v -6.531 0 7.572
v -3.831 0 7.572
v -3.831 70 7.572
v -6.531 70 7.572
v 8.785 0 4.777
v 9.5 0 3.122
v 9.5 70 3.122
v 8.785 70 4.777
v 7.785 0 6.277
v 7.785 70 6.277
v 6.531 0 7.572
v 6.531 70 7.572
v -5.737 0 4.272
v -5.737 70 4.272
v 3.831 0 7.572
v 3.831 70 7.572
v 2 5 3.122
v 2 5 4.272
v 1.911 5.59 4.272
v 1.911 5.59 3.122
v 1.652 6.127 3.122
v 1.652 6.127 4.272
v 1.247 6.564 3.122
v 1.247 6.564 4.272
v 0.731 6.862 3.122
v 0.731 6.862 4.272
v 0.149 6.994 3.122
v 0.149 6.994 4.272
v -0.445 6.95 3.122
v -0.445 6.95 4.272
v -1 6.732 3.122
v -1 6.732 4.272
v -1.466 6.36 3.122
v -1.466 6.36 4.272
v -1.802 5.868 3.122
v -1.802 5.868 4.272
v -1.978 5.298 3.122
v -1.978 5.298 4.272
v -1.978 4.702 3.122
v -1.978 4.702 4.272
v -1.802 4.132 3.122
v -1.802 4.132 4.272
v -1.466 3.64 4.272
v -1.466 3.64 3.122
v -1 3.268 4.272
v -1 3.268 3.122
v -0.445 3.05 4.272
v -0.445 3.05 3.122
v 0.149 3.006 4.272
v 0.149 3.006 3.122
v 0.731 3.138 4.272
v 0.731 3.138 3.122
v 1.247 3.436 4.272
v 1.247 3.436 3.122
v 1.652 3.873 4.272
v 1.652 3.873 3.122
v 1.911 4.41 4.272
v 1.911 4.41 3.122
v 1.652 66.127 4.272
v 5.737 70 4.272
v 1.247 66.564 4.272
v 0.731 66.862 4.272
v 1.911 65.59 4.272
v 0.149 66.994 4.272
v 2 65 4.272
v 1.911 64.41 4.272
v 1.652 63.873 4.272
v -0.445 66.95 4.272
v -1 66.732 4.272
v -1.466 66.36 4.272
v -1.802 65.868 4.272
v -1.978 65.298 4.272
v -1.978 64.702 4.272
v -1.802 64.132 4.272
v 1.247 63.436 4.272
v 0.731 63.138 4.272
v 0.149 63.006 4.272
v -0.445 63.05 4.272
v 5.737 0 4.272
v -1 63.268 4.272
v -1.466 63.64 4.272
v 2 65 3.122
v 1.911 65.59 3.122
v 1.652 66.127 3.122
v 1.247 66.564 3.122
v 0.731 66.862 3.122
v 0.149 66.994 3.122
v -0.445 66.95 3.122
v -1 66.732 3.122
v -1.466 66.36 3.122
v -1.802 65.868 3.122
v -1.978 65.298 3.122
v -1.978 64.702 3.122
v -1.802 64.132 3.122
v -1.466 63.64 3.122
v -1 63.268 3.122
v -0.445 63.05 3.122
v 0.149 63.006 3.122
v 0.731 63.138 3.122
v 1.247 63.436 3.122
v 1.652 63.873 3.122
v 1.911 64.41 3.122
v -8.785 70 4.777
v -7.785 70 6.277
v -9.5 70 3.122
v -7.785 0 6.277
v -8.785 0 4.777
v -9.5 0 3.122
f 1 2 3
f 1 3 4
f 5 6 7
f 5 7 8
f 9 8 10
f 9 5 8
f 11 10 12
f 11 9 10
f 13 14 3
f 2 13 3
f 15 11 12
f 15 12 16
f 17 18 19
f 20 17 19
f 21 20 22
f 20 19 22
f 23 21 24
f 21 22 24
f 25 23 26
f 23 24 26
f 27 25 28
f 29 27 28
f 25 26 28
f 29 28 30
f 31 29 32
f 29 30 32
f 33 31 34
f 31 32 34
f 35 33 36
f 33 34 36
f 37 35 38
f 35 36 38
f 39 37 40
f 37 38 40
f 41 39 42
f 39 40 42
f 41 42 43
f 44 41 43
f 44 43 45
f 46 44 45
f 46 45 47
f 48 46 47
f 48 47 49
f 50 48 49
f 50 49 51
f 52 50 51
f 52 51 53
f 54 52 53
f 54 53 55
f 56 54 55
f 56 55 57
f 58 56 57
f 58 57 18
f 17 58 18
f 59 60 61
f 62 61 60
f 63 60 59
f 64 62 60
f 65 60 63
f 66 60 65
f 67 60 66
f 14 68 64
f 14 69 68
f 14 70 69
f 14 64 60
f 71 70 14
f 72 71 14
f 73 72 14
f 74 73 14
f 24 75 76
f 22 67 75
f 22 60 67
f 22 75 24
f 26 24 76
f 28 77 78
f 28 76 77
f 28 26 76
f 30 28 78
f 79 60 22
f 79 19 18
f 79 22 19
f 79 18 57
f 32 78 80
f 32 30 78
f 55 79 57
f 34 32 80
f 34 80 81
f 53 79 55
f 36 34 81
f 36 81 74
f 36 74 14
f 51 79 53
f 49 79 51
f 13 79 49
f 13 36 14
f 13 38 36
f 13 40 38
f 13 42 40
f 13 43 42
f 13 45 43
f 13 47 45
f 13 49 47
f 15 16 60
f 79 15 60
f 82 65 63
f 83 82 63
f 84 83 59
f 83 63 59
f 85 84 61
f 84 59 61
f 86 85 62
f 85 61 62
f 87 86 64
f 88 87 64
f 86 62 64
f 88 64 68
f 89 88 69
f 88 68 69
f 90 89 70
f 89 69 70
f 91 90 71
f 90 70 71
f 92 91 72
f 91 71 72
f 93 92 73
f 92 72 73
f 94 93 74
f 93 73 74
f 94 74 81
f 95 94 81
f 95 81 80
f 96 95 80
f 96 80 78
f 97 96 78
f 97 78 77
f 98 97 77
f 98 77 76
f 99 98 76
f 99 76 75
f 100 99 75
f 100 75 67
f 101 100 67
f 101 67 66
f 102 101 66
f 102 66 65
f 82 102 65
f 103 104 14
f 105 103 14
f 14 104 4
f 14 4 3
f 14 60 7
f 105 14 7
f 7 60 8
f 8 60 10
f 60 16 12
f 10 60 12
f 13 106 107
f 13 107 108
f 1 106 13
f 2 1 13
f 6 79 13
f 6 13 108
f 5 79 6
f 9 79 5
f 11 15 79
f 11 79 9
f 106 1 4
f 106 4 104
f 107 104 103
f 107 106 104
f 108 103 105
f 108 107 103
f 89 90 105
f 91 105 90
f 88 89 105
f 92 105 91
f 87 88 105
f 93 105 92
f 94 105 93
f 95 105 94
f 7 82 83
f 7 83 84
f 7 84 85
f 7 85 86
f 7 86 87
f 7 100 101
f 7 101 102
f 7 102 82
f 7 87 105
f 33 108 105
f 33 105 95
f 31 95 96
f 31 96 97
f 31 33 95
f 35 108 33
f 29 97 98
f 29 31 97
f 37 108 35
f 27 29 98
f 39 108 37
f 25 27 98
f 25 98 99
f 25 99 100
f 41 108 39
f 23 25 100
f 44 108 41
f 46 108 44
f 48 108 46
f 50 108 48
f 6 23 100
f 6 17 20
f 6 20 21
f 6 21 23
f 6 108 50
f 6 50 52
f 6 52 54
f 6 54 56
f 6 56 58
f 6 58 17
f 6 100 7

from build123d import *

# Parameters (mm, degrees)
F1_DEPTH = 70
F2_R     = 2
F3_DEPTH = 1.151


with BuildPart() as f1:
    # F0 (on Front) → F1 (new body)
    with BuildSketch(Plane.XZ):
        with BuildLine():
            Line((-9.5, 3.122499), (9.5, 3.122499))
            ThreePointArc((9.5, 3.122499), (8.318707, 5.549695), (6.531252, 7.572499))
            Line((6.531252, 7.572499), (3.831252, 7.572499))
            Line((3.831252, 7.572499), (5.736508, 4.272499))
            Line((5.736508, 4.272499), (0, 4.272499))
            Line((0, 4.272499), (-5.736508, 4.272499))
            Line((-5.736508, 4.272499), (-3.831252, 7.572499))
            Line((-3.831252, 7.572499), (-6.531252, 7.572499))
            ThreePointArc((-6.531252, 7.572499), (-8.318707, 5.549695), (-9.5, 3.122499))
        make_face()
    extrude(amount=-F1_DEPTH)

    # F2 (on face) → F3 (cut, through all)
    with BuildSketch(Plane.XY.offset(4.272499)):
        with Locations((0, 5)):
            Circle(F2_R)
        with Locations((0, 65)):
            Circle(F2_R)
    extrude(amount=-F3_DEPTH, mode=Mode.SUBTRACT)


solid = f1.part
